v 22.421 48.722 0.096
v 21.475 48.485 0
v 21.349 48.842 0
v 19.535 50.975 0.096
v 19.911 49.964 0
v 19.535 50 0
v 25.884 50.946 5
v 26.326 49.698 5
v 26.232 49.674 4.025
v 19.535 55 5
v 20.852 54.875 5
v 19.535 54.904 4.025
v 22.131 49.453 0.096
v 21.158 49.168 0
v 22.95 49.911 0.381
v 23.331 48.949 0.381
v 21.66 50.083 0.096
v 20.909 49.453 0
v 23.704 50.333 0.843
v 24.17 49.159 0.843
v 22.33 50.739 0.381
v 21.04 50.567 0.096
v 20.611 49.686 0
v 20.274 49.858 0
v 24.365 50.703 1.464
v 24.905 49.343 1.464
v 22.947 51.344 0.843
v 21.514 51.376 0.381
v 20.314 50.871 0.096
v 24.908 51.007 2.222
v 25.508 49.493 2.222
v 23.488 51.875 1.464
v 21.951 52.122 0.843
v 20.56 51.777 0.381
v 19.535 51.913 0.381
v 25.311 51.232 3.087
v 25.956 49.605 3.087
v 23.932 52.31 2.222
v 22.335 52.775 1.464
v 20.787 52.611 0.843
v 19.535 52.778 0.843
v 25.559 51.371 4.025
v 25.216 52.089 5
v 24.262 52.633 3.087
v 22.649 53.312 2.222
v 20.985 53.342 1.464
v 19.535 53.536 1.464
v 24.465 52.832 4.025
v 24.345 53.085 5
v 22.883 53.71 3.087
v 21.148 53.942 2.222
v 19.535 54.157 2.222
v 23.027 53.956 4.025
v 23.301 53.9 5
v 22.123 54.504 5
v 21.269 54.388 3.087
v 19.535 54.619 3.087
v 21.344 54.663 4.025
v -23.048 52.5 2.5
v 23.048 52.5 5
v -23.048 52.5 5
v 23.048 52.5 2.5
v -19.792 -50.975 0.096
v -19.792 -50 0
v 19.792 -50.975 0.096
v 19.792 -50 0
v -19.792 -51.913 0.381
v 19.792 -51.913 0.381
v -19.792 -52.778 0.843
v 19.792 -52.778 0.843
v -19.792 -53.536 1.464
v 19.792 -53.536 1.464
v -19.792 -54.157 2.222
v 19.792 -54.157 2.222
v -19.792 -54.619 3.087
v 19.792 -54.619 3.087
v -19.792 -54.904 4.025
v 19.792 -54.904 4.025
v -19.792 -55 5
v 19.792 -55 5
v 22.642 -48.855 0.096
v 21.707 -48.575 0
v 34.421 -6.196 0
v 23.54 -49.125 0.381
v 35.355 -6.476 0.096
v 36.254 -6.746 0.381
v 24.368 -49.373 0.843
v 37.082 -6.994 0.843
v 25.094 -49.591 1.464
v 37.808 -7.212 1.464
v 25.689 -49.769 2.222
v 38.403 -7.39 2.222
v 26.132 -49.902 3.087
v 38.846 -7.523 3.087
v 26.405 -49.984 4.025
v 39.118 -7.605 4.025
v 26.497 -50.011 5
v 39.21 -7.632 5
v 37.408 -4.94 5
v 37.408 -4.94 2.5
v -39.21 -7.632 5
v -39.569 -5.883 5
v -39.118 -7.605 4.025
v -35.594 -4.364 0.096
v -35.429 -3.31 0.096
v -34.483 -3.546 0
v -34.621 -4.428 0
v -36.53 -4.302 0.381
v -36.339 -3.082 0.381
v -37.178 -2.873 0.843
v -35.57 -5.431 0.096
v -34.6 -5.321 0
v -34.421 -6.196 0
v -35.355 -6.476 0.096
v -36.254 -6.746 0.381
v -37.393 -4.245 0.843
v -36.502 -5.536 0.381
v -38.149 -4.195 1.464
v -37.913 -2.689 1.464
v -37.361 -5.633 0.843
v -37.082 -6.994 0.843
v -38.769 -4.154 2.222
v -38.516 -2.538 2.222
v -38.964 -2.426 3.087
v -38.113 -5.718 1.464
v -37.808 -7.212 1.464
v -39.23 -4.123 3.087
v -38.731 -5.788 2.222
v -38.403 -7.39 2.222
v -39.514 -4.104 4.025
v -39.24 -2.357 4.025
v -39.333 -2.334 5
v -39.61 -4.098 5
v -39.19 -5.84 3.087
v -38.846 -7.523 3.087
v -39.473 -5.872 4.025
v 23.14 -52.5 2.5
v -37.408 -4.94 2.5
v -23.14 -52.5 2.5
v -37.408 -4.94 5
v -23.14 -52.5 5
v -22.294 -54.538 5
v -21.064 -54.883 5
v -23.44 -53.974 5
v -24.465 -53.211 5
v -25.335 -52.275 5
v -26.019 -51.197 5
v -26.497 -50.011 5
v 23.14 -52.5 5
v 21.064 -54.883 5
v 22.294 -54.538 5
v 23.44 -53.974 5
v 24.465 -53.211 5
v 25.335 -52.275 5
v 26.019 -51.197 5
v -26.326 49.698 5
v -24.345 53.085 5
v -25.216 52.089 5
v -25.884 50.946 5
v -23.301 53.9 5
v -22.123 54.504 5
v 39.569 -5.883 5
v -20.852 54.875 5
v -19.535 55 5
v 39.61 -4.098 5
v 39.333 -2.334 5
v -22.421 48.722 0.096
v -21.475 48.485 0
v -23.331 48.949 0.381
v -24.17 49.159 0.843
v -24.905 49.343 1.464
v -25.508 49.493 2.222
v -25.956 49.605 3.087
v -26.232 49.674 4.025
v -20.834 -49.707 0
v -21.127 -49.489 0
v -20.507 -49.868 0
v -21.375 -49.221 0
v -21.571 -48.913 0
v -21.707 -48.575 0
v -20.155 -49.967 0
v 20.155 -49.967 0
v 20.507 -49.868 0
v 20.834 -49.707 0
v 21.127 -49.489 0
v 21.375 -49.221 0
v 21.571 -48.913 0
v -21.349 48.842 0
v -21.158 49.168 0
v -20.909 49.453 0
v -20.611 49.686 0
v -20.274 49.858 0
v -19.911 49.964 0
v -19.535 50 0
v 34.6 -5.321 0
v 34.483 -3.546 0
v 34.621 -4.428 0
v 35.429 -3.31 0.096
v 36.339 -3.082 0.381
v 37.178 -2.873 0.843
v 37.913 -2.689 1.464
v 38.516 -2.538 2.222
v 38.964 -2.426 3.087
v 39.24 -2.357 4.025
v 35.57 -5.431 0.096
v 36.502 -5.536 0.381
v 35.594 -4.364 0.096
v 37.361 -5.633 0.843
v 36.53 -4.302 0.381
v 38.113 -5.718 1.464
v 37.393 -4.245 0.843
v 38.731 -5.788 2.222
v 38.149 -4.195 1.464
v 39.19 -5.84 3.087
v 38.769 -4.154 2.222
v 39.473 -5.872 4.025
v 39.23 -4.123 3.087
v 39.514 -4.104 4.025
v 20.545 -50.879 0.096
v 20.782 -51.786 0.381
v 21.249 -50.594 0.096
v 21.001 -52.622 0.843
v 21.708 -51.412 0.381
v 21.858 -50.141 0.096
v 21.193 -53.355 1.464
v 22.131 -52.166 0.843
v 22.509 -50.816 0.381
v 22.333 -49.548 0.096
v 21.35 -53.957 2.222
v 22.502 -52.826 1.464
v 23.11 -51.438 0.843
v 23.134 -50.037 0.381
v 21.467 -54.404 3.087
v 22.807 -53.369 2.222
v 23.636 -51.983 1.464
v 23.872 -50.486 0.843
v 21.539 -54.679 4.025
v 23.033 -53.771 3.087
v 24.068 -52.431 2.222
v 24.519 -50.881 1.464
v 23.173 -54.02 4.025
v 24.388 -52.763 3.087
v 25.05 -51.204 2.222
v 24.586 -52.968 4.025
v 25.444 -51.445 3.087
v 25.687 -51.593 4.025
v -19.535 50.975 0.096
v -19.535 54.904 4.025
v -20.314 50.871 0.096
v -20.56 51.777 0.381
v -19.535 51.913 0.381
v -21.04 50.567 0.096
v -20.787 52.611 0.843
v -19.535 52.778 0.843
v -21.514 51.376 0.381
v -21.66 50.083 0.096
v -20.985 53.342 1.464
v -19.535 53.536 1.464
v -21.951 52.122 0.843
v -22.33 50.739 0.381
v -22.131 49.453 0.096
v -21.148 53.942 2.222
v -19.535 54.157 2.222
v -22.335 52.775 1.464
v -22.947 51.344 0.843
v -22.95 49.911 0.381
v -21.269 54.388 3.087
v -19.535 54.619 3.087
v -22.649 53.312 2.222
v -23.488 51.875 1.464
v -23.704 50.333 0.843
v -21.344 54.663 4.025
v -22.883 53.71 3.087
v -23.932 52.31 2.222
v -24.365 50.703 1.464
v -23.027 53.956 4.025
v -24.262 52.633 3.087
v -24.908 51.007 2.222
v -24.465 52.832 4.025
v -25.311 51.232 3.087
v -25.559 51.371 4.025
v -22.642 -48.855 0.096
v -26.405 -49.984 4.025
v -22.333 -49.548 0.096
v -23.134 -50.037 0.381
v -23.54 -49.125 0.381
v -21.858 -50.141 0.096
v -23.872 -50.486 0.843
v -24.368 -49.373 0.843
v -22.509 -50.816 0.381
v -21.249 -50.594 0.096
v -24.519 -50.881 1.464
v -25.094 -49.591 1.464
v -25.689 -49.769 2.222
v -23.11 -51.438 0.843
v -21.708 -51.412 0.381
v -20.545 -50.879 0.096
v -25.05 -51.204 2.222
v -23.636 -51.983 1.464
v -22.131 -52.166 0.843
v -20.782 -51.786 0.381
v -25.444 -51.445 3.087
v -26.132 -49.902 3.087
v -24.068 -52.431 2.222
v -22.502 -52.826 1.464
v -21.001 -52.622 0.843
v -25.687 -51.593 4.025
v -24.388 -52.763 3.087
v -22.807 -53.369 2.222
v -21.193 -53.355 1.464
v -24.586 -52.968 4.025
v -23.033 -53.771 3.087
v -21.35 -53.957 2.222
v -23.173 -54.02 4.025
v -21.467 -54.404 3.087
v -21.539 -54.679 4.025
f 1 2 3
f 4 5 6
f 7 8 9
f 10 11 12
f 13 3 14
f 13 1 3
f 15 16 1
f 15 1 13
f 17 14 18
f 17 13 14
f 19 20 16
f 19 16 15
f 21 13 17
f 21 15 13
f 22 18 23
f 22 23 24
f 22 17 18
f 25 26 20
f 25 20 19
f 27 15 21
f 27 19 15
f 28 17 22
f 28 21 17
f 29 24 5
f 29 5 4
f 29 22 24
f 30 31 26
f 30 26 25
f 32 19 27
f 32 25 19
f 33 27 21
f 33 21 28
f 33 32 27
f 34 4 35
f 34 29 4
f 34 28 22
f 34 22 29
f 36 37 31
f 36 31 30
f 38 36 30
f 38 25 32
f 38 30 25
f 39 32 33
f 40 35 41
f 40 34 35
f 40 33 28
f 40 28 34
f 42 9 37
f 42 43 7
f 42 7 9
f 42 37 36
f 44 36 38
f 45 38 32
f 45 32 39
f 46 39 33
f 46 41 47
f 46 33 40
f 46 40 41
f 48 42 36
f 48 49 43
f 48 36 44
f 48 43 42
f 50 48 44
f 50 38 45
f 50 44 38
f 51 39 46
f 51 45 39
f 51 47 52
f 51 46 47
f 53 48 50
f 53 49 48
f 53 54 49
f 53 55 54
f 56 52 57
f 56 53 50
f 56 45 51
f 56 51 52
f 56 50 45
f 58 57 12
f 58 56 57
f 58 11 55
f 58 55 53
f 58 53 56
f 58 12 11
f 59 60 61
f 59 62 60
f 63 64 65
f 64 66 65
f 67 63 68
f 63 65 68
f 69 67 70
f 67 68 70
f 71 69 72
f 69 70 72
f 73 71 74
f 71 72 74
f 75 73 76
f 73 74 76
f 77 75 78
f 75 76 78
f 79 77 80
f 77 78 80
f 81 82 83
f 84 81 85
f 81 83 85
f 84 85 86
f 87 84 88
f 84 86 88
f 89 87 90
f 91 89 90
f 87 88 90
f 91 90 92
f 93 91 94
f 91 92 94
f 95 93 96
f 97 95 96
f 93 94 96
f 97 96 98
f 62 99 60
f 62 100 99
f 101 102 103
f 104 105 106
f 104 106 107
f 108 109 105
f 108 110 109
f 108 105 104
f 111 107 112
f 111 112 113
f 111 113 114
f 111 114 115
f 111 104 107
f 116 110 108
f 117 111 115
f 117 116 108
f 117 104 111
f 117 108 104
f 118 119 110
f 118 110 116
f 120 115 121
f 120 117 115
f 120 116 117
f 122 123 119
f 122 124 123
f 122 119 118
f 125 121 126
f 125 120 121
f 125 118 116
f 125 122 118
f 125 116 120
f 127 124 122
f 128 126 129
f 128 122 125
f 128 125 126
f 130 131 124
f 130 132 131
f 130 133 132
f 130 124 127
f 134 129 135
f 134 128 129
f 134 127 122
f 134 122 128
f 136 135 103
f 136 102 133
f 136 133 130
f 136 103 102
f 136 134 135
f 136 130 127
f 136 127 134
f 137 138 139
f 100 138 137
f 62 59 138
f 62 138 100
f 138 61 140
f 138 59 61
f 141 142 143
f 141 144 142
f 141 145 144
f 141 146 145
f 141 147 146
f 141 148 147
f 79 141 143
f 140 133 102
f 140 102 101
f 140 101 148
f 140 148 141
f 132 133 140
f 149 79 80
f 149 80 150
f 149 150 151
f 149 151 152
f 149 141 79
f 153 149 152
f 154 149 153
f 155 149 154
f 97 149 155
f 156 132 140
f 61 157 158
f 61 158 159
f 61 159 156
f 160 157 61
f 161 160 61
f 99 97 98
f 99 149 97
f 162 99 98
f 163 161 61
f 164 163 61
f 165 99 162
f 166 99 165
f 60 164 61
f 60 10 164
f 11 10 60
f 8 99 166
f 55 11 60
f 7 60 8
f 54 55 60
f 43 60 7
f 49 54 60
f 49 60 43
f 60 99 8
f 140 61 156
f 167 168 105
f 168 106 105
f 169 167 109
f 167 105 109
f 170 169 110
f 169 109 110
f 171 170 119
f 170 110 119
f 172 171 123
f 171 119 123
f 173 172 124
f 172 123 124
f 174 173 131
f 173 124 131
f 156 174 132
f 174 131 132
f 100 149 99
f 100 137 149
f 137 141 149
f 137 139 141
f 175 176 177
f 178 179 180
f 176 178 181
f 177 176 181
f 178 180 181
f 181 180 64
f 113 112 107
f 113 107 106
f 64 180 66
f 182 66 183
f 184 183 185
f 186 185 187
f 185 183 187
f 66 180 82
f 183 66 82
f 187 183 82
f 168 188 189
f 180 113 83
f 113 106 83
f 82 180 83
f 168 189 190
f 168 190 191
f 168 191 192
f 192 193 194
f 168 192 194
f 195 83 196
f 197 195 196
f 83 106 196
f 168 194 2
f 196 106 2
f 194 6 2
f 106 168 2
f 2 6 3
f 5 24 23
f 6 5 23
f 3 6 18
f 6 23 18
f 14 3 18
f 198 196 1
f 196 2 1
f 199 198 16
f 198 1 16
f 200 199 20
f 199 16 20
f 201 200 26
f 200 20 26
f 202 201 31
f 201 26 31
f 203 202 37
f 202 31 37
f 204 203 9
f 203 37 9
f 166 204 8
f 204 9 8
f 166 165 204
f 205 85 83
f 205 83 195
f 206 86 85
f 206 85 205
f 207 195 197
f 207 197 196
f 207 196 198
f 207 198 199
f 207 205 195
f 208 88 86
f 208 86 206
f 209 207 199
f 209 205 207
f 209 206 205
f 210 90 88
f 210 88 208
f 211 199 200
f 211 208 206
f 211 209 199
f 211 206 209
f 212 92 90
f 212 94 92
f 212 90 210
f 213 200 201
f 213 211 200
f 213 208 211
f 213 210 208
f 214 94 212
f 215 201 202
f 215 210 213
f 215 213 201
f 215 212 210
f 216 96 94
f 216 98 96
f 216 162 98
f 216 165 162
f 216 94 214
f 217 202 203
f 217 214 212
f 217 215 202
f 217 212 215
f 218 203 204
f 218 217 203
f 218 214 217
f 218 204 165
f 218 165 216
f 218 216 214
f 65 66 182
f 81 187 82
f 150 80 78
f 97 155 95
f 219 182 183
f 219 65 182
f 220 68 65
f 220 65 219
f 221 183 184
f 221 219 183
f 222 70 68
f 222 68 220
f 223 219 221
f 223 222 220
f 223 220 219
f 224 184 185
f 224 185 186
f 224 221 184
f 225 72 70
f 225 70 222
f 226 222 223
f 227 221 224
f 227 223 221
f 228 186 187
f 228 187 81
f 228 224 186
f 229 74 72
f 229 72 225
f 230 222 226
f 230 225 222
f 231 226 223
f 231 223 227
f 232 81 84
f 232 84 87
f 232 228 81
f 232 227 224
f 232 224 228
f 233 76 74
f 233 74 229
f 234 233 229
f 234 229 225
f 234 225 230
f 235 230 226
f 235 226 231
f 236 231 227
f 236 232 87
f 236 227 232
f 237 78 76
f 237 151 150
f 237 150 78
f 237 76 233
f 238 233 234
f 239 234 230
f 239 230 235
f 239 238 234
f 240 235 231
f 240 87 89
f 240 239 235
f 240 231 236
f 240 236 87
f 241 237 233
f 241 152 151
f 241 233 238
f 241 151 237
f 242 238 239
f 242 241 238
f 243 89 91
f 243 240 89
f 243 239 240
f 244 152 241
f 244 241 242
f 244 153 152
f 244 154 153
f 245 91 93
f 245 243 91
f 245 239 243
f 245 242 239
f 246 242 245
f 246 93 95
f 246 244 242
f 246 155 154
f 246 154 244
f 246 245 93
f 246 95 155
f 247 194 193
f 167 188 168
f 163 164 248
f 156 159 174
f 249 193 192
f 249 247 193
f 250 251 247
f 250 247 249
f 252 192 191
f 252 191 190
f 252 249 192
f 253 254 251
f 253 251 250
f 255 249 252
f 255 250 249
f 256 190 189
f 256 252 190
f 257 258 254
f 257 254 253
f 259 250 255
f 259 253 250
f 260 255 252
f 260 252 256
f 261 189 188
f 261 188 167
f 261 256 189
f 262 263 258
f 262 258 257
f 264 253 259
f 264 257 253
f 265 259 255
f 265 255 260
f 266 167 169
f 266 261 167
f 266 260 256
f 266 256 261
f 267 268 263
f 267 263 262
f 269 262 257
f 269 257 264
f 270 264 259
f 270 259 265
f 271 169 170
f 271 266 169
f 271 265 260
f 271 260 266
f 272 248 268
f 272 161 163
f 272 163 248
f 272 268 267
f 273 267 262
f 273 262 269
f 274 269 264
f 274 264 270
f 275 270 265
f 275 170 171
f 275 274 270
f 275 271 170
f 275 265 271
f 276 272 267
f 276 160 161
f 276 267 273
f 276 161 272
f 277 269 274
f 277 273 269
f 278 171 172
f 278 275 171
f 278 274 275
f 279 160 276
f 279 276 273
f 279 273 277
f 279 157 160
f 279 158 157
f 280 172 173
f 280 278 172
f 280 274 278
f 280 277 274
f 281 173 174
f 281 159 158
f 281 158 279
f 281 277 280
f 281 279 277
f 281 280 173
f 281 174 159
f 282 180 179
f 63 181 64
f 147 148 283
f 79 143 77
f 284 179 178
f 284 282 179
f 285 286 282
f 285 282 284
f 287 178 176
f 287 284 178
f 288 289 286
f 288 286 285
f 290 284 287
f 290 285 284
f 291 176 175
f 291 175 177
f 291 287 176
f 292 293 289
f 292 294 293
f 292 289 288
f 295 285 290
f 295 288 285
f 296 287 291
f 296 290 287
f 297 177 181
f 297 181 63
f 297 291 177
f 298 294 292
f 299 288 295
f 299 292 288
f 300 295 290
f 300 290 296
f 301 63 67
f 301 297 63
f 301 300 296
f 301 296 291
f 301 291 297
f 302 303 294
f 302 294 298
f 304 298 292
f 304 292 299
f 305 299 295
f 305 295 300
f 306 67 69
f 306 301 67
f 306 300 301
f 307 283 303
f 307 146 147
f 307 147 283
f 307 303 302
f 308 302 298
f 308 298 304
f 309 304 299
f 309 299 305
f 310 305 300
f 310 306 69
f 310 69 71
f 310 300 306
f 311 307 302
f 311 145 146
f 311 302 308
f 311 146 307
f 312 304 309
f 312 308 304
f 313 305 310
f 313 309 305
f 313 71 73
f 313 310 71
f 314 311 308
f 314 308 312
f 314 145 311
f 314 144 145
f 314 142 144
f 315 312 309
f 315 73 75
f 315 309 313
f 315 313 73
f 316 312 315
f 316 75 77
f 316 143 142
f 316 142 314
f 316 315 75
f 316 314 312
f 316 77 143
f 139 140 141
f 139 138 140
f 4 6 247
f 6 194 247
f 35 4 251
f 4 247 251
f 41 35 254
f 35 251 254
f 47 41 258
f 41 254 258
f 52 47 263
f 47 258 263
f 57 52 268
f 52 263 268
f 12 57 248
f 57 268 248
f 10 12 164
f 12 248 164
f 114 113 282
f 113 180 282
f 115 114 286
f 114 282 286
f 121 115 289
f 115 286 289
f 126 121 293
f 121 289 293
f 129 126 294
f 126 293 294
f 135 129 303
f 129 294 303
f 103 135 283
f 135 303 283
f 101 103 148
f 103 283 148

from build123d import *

# Parameters (mm, degrees)
F1_DEPTH = 5
F2_T     = -2.5
F3_R     = 7
F4_R     = 7
F5_R     = 10
F6_R     = 10
F7_R     = 7
F8_R     = 7
F9_R     = 4.99999


# Not quite as in the source:
# - a fillet or chamfer is up to 0.001 mm smaller than in the source, because OpenCascade refuses the exact size


with BuildPart() as f1:
    # F0 (on Top) → F1 (new body)
    with BuildSketch(Plane.XY):
        Polygon((25, 55), (-25, 55), (-40, -5), (-25, -55), (25, -55), (40, -5), align=None)
    extrude(amount=F1_DEPTH)

    # F2
    f2_openings = [f1.faces().sort_by_distance(p)[0] for p in [
        (0, -0.384615, 5),
    ]]
    offset(amount=F2_T, openings=f2_openings)

    # F3
    f3_edges = [f1.edges().sort_by_distance(p)[0] for p in [
        (25, 55, 2.5),
    ]]
    fillet(f3_edges, radius=F3_R)

    # F4
    f4_edges = [f1.edges().sort_by_distance(p)[0] for p in [
        (-25, 55, 2.5),
    ]]
    fillet(f4_edges, radius=F4_R)

    # F5
    f5_edges = [f1.edges().sort_by_distance(p)[0] for p in [
        (-40, -5, 2.5),
    ]]
    fillet(f5_edges, radius=F5_R)

    # F6
    f6_edges = [f1.edges().sort_by_distance(p)[0] for p in [
        (40, -5, 2.5),
    ]]
    fillet(f6_edges, radius=F6_R)

    # F7
    f7_edges = [f1.edges().sort_by_distance(p)[0] for p in [
        (-25, -55, 2.5),
    ]]
    fillet(f7_edges, radius=F7_R)

    # F8
    f8_edges = [f1.edges().sort_by_distance(p)[0] for p in [
        (25, -55, 2.5),
    ]]
    fillet(f8_edges, radius=F8_R)

    # F9 (radius 5 in the source; OpenCascade refuses exactly that, so slightly less here)
    f9_edges = [f1.edges().sort_by_distance(p)[0] for p in [
        (32.853411, -28.821964, 0),
    ]]
    fillet(f9_edges, radius=F9_R)


solid = f1.part
